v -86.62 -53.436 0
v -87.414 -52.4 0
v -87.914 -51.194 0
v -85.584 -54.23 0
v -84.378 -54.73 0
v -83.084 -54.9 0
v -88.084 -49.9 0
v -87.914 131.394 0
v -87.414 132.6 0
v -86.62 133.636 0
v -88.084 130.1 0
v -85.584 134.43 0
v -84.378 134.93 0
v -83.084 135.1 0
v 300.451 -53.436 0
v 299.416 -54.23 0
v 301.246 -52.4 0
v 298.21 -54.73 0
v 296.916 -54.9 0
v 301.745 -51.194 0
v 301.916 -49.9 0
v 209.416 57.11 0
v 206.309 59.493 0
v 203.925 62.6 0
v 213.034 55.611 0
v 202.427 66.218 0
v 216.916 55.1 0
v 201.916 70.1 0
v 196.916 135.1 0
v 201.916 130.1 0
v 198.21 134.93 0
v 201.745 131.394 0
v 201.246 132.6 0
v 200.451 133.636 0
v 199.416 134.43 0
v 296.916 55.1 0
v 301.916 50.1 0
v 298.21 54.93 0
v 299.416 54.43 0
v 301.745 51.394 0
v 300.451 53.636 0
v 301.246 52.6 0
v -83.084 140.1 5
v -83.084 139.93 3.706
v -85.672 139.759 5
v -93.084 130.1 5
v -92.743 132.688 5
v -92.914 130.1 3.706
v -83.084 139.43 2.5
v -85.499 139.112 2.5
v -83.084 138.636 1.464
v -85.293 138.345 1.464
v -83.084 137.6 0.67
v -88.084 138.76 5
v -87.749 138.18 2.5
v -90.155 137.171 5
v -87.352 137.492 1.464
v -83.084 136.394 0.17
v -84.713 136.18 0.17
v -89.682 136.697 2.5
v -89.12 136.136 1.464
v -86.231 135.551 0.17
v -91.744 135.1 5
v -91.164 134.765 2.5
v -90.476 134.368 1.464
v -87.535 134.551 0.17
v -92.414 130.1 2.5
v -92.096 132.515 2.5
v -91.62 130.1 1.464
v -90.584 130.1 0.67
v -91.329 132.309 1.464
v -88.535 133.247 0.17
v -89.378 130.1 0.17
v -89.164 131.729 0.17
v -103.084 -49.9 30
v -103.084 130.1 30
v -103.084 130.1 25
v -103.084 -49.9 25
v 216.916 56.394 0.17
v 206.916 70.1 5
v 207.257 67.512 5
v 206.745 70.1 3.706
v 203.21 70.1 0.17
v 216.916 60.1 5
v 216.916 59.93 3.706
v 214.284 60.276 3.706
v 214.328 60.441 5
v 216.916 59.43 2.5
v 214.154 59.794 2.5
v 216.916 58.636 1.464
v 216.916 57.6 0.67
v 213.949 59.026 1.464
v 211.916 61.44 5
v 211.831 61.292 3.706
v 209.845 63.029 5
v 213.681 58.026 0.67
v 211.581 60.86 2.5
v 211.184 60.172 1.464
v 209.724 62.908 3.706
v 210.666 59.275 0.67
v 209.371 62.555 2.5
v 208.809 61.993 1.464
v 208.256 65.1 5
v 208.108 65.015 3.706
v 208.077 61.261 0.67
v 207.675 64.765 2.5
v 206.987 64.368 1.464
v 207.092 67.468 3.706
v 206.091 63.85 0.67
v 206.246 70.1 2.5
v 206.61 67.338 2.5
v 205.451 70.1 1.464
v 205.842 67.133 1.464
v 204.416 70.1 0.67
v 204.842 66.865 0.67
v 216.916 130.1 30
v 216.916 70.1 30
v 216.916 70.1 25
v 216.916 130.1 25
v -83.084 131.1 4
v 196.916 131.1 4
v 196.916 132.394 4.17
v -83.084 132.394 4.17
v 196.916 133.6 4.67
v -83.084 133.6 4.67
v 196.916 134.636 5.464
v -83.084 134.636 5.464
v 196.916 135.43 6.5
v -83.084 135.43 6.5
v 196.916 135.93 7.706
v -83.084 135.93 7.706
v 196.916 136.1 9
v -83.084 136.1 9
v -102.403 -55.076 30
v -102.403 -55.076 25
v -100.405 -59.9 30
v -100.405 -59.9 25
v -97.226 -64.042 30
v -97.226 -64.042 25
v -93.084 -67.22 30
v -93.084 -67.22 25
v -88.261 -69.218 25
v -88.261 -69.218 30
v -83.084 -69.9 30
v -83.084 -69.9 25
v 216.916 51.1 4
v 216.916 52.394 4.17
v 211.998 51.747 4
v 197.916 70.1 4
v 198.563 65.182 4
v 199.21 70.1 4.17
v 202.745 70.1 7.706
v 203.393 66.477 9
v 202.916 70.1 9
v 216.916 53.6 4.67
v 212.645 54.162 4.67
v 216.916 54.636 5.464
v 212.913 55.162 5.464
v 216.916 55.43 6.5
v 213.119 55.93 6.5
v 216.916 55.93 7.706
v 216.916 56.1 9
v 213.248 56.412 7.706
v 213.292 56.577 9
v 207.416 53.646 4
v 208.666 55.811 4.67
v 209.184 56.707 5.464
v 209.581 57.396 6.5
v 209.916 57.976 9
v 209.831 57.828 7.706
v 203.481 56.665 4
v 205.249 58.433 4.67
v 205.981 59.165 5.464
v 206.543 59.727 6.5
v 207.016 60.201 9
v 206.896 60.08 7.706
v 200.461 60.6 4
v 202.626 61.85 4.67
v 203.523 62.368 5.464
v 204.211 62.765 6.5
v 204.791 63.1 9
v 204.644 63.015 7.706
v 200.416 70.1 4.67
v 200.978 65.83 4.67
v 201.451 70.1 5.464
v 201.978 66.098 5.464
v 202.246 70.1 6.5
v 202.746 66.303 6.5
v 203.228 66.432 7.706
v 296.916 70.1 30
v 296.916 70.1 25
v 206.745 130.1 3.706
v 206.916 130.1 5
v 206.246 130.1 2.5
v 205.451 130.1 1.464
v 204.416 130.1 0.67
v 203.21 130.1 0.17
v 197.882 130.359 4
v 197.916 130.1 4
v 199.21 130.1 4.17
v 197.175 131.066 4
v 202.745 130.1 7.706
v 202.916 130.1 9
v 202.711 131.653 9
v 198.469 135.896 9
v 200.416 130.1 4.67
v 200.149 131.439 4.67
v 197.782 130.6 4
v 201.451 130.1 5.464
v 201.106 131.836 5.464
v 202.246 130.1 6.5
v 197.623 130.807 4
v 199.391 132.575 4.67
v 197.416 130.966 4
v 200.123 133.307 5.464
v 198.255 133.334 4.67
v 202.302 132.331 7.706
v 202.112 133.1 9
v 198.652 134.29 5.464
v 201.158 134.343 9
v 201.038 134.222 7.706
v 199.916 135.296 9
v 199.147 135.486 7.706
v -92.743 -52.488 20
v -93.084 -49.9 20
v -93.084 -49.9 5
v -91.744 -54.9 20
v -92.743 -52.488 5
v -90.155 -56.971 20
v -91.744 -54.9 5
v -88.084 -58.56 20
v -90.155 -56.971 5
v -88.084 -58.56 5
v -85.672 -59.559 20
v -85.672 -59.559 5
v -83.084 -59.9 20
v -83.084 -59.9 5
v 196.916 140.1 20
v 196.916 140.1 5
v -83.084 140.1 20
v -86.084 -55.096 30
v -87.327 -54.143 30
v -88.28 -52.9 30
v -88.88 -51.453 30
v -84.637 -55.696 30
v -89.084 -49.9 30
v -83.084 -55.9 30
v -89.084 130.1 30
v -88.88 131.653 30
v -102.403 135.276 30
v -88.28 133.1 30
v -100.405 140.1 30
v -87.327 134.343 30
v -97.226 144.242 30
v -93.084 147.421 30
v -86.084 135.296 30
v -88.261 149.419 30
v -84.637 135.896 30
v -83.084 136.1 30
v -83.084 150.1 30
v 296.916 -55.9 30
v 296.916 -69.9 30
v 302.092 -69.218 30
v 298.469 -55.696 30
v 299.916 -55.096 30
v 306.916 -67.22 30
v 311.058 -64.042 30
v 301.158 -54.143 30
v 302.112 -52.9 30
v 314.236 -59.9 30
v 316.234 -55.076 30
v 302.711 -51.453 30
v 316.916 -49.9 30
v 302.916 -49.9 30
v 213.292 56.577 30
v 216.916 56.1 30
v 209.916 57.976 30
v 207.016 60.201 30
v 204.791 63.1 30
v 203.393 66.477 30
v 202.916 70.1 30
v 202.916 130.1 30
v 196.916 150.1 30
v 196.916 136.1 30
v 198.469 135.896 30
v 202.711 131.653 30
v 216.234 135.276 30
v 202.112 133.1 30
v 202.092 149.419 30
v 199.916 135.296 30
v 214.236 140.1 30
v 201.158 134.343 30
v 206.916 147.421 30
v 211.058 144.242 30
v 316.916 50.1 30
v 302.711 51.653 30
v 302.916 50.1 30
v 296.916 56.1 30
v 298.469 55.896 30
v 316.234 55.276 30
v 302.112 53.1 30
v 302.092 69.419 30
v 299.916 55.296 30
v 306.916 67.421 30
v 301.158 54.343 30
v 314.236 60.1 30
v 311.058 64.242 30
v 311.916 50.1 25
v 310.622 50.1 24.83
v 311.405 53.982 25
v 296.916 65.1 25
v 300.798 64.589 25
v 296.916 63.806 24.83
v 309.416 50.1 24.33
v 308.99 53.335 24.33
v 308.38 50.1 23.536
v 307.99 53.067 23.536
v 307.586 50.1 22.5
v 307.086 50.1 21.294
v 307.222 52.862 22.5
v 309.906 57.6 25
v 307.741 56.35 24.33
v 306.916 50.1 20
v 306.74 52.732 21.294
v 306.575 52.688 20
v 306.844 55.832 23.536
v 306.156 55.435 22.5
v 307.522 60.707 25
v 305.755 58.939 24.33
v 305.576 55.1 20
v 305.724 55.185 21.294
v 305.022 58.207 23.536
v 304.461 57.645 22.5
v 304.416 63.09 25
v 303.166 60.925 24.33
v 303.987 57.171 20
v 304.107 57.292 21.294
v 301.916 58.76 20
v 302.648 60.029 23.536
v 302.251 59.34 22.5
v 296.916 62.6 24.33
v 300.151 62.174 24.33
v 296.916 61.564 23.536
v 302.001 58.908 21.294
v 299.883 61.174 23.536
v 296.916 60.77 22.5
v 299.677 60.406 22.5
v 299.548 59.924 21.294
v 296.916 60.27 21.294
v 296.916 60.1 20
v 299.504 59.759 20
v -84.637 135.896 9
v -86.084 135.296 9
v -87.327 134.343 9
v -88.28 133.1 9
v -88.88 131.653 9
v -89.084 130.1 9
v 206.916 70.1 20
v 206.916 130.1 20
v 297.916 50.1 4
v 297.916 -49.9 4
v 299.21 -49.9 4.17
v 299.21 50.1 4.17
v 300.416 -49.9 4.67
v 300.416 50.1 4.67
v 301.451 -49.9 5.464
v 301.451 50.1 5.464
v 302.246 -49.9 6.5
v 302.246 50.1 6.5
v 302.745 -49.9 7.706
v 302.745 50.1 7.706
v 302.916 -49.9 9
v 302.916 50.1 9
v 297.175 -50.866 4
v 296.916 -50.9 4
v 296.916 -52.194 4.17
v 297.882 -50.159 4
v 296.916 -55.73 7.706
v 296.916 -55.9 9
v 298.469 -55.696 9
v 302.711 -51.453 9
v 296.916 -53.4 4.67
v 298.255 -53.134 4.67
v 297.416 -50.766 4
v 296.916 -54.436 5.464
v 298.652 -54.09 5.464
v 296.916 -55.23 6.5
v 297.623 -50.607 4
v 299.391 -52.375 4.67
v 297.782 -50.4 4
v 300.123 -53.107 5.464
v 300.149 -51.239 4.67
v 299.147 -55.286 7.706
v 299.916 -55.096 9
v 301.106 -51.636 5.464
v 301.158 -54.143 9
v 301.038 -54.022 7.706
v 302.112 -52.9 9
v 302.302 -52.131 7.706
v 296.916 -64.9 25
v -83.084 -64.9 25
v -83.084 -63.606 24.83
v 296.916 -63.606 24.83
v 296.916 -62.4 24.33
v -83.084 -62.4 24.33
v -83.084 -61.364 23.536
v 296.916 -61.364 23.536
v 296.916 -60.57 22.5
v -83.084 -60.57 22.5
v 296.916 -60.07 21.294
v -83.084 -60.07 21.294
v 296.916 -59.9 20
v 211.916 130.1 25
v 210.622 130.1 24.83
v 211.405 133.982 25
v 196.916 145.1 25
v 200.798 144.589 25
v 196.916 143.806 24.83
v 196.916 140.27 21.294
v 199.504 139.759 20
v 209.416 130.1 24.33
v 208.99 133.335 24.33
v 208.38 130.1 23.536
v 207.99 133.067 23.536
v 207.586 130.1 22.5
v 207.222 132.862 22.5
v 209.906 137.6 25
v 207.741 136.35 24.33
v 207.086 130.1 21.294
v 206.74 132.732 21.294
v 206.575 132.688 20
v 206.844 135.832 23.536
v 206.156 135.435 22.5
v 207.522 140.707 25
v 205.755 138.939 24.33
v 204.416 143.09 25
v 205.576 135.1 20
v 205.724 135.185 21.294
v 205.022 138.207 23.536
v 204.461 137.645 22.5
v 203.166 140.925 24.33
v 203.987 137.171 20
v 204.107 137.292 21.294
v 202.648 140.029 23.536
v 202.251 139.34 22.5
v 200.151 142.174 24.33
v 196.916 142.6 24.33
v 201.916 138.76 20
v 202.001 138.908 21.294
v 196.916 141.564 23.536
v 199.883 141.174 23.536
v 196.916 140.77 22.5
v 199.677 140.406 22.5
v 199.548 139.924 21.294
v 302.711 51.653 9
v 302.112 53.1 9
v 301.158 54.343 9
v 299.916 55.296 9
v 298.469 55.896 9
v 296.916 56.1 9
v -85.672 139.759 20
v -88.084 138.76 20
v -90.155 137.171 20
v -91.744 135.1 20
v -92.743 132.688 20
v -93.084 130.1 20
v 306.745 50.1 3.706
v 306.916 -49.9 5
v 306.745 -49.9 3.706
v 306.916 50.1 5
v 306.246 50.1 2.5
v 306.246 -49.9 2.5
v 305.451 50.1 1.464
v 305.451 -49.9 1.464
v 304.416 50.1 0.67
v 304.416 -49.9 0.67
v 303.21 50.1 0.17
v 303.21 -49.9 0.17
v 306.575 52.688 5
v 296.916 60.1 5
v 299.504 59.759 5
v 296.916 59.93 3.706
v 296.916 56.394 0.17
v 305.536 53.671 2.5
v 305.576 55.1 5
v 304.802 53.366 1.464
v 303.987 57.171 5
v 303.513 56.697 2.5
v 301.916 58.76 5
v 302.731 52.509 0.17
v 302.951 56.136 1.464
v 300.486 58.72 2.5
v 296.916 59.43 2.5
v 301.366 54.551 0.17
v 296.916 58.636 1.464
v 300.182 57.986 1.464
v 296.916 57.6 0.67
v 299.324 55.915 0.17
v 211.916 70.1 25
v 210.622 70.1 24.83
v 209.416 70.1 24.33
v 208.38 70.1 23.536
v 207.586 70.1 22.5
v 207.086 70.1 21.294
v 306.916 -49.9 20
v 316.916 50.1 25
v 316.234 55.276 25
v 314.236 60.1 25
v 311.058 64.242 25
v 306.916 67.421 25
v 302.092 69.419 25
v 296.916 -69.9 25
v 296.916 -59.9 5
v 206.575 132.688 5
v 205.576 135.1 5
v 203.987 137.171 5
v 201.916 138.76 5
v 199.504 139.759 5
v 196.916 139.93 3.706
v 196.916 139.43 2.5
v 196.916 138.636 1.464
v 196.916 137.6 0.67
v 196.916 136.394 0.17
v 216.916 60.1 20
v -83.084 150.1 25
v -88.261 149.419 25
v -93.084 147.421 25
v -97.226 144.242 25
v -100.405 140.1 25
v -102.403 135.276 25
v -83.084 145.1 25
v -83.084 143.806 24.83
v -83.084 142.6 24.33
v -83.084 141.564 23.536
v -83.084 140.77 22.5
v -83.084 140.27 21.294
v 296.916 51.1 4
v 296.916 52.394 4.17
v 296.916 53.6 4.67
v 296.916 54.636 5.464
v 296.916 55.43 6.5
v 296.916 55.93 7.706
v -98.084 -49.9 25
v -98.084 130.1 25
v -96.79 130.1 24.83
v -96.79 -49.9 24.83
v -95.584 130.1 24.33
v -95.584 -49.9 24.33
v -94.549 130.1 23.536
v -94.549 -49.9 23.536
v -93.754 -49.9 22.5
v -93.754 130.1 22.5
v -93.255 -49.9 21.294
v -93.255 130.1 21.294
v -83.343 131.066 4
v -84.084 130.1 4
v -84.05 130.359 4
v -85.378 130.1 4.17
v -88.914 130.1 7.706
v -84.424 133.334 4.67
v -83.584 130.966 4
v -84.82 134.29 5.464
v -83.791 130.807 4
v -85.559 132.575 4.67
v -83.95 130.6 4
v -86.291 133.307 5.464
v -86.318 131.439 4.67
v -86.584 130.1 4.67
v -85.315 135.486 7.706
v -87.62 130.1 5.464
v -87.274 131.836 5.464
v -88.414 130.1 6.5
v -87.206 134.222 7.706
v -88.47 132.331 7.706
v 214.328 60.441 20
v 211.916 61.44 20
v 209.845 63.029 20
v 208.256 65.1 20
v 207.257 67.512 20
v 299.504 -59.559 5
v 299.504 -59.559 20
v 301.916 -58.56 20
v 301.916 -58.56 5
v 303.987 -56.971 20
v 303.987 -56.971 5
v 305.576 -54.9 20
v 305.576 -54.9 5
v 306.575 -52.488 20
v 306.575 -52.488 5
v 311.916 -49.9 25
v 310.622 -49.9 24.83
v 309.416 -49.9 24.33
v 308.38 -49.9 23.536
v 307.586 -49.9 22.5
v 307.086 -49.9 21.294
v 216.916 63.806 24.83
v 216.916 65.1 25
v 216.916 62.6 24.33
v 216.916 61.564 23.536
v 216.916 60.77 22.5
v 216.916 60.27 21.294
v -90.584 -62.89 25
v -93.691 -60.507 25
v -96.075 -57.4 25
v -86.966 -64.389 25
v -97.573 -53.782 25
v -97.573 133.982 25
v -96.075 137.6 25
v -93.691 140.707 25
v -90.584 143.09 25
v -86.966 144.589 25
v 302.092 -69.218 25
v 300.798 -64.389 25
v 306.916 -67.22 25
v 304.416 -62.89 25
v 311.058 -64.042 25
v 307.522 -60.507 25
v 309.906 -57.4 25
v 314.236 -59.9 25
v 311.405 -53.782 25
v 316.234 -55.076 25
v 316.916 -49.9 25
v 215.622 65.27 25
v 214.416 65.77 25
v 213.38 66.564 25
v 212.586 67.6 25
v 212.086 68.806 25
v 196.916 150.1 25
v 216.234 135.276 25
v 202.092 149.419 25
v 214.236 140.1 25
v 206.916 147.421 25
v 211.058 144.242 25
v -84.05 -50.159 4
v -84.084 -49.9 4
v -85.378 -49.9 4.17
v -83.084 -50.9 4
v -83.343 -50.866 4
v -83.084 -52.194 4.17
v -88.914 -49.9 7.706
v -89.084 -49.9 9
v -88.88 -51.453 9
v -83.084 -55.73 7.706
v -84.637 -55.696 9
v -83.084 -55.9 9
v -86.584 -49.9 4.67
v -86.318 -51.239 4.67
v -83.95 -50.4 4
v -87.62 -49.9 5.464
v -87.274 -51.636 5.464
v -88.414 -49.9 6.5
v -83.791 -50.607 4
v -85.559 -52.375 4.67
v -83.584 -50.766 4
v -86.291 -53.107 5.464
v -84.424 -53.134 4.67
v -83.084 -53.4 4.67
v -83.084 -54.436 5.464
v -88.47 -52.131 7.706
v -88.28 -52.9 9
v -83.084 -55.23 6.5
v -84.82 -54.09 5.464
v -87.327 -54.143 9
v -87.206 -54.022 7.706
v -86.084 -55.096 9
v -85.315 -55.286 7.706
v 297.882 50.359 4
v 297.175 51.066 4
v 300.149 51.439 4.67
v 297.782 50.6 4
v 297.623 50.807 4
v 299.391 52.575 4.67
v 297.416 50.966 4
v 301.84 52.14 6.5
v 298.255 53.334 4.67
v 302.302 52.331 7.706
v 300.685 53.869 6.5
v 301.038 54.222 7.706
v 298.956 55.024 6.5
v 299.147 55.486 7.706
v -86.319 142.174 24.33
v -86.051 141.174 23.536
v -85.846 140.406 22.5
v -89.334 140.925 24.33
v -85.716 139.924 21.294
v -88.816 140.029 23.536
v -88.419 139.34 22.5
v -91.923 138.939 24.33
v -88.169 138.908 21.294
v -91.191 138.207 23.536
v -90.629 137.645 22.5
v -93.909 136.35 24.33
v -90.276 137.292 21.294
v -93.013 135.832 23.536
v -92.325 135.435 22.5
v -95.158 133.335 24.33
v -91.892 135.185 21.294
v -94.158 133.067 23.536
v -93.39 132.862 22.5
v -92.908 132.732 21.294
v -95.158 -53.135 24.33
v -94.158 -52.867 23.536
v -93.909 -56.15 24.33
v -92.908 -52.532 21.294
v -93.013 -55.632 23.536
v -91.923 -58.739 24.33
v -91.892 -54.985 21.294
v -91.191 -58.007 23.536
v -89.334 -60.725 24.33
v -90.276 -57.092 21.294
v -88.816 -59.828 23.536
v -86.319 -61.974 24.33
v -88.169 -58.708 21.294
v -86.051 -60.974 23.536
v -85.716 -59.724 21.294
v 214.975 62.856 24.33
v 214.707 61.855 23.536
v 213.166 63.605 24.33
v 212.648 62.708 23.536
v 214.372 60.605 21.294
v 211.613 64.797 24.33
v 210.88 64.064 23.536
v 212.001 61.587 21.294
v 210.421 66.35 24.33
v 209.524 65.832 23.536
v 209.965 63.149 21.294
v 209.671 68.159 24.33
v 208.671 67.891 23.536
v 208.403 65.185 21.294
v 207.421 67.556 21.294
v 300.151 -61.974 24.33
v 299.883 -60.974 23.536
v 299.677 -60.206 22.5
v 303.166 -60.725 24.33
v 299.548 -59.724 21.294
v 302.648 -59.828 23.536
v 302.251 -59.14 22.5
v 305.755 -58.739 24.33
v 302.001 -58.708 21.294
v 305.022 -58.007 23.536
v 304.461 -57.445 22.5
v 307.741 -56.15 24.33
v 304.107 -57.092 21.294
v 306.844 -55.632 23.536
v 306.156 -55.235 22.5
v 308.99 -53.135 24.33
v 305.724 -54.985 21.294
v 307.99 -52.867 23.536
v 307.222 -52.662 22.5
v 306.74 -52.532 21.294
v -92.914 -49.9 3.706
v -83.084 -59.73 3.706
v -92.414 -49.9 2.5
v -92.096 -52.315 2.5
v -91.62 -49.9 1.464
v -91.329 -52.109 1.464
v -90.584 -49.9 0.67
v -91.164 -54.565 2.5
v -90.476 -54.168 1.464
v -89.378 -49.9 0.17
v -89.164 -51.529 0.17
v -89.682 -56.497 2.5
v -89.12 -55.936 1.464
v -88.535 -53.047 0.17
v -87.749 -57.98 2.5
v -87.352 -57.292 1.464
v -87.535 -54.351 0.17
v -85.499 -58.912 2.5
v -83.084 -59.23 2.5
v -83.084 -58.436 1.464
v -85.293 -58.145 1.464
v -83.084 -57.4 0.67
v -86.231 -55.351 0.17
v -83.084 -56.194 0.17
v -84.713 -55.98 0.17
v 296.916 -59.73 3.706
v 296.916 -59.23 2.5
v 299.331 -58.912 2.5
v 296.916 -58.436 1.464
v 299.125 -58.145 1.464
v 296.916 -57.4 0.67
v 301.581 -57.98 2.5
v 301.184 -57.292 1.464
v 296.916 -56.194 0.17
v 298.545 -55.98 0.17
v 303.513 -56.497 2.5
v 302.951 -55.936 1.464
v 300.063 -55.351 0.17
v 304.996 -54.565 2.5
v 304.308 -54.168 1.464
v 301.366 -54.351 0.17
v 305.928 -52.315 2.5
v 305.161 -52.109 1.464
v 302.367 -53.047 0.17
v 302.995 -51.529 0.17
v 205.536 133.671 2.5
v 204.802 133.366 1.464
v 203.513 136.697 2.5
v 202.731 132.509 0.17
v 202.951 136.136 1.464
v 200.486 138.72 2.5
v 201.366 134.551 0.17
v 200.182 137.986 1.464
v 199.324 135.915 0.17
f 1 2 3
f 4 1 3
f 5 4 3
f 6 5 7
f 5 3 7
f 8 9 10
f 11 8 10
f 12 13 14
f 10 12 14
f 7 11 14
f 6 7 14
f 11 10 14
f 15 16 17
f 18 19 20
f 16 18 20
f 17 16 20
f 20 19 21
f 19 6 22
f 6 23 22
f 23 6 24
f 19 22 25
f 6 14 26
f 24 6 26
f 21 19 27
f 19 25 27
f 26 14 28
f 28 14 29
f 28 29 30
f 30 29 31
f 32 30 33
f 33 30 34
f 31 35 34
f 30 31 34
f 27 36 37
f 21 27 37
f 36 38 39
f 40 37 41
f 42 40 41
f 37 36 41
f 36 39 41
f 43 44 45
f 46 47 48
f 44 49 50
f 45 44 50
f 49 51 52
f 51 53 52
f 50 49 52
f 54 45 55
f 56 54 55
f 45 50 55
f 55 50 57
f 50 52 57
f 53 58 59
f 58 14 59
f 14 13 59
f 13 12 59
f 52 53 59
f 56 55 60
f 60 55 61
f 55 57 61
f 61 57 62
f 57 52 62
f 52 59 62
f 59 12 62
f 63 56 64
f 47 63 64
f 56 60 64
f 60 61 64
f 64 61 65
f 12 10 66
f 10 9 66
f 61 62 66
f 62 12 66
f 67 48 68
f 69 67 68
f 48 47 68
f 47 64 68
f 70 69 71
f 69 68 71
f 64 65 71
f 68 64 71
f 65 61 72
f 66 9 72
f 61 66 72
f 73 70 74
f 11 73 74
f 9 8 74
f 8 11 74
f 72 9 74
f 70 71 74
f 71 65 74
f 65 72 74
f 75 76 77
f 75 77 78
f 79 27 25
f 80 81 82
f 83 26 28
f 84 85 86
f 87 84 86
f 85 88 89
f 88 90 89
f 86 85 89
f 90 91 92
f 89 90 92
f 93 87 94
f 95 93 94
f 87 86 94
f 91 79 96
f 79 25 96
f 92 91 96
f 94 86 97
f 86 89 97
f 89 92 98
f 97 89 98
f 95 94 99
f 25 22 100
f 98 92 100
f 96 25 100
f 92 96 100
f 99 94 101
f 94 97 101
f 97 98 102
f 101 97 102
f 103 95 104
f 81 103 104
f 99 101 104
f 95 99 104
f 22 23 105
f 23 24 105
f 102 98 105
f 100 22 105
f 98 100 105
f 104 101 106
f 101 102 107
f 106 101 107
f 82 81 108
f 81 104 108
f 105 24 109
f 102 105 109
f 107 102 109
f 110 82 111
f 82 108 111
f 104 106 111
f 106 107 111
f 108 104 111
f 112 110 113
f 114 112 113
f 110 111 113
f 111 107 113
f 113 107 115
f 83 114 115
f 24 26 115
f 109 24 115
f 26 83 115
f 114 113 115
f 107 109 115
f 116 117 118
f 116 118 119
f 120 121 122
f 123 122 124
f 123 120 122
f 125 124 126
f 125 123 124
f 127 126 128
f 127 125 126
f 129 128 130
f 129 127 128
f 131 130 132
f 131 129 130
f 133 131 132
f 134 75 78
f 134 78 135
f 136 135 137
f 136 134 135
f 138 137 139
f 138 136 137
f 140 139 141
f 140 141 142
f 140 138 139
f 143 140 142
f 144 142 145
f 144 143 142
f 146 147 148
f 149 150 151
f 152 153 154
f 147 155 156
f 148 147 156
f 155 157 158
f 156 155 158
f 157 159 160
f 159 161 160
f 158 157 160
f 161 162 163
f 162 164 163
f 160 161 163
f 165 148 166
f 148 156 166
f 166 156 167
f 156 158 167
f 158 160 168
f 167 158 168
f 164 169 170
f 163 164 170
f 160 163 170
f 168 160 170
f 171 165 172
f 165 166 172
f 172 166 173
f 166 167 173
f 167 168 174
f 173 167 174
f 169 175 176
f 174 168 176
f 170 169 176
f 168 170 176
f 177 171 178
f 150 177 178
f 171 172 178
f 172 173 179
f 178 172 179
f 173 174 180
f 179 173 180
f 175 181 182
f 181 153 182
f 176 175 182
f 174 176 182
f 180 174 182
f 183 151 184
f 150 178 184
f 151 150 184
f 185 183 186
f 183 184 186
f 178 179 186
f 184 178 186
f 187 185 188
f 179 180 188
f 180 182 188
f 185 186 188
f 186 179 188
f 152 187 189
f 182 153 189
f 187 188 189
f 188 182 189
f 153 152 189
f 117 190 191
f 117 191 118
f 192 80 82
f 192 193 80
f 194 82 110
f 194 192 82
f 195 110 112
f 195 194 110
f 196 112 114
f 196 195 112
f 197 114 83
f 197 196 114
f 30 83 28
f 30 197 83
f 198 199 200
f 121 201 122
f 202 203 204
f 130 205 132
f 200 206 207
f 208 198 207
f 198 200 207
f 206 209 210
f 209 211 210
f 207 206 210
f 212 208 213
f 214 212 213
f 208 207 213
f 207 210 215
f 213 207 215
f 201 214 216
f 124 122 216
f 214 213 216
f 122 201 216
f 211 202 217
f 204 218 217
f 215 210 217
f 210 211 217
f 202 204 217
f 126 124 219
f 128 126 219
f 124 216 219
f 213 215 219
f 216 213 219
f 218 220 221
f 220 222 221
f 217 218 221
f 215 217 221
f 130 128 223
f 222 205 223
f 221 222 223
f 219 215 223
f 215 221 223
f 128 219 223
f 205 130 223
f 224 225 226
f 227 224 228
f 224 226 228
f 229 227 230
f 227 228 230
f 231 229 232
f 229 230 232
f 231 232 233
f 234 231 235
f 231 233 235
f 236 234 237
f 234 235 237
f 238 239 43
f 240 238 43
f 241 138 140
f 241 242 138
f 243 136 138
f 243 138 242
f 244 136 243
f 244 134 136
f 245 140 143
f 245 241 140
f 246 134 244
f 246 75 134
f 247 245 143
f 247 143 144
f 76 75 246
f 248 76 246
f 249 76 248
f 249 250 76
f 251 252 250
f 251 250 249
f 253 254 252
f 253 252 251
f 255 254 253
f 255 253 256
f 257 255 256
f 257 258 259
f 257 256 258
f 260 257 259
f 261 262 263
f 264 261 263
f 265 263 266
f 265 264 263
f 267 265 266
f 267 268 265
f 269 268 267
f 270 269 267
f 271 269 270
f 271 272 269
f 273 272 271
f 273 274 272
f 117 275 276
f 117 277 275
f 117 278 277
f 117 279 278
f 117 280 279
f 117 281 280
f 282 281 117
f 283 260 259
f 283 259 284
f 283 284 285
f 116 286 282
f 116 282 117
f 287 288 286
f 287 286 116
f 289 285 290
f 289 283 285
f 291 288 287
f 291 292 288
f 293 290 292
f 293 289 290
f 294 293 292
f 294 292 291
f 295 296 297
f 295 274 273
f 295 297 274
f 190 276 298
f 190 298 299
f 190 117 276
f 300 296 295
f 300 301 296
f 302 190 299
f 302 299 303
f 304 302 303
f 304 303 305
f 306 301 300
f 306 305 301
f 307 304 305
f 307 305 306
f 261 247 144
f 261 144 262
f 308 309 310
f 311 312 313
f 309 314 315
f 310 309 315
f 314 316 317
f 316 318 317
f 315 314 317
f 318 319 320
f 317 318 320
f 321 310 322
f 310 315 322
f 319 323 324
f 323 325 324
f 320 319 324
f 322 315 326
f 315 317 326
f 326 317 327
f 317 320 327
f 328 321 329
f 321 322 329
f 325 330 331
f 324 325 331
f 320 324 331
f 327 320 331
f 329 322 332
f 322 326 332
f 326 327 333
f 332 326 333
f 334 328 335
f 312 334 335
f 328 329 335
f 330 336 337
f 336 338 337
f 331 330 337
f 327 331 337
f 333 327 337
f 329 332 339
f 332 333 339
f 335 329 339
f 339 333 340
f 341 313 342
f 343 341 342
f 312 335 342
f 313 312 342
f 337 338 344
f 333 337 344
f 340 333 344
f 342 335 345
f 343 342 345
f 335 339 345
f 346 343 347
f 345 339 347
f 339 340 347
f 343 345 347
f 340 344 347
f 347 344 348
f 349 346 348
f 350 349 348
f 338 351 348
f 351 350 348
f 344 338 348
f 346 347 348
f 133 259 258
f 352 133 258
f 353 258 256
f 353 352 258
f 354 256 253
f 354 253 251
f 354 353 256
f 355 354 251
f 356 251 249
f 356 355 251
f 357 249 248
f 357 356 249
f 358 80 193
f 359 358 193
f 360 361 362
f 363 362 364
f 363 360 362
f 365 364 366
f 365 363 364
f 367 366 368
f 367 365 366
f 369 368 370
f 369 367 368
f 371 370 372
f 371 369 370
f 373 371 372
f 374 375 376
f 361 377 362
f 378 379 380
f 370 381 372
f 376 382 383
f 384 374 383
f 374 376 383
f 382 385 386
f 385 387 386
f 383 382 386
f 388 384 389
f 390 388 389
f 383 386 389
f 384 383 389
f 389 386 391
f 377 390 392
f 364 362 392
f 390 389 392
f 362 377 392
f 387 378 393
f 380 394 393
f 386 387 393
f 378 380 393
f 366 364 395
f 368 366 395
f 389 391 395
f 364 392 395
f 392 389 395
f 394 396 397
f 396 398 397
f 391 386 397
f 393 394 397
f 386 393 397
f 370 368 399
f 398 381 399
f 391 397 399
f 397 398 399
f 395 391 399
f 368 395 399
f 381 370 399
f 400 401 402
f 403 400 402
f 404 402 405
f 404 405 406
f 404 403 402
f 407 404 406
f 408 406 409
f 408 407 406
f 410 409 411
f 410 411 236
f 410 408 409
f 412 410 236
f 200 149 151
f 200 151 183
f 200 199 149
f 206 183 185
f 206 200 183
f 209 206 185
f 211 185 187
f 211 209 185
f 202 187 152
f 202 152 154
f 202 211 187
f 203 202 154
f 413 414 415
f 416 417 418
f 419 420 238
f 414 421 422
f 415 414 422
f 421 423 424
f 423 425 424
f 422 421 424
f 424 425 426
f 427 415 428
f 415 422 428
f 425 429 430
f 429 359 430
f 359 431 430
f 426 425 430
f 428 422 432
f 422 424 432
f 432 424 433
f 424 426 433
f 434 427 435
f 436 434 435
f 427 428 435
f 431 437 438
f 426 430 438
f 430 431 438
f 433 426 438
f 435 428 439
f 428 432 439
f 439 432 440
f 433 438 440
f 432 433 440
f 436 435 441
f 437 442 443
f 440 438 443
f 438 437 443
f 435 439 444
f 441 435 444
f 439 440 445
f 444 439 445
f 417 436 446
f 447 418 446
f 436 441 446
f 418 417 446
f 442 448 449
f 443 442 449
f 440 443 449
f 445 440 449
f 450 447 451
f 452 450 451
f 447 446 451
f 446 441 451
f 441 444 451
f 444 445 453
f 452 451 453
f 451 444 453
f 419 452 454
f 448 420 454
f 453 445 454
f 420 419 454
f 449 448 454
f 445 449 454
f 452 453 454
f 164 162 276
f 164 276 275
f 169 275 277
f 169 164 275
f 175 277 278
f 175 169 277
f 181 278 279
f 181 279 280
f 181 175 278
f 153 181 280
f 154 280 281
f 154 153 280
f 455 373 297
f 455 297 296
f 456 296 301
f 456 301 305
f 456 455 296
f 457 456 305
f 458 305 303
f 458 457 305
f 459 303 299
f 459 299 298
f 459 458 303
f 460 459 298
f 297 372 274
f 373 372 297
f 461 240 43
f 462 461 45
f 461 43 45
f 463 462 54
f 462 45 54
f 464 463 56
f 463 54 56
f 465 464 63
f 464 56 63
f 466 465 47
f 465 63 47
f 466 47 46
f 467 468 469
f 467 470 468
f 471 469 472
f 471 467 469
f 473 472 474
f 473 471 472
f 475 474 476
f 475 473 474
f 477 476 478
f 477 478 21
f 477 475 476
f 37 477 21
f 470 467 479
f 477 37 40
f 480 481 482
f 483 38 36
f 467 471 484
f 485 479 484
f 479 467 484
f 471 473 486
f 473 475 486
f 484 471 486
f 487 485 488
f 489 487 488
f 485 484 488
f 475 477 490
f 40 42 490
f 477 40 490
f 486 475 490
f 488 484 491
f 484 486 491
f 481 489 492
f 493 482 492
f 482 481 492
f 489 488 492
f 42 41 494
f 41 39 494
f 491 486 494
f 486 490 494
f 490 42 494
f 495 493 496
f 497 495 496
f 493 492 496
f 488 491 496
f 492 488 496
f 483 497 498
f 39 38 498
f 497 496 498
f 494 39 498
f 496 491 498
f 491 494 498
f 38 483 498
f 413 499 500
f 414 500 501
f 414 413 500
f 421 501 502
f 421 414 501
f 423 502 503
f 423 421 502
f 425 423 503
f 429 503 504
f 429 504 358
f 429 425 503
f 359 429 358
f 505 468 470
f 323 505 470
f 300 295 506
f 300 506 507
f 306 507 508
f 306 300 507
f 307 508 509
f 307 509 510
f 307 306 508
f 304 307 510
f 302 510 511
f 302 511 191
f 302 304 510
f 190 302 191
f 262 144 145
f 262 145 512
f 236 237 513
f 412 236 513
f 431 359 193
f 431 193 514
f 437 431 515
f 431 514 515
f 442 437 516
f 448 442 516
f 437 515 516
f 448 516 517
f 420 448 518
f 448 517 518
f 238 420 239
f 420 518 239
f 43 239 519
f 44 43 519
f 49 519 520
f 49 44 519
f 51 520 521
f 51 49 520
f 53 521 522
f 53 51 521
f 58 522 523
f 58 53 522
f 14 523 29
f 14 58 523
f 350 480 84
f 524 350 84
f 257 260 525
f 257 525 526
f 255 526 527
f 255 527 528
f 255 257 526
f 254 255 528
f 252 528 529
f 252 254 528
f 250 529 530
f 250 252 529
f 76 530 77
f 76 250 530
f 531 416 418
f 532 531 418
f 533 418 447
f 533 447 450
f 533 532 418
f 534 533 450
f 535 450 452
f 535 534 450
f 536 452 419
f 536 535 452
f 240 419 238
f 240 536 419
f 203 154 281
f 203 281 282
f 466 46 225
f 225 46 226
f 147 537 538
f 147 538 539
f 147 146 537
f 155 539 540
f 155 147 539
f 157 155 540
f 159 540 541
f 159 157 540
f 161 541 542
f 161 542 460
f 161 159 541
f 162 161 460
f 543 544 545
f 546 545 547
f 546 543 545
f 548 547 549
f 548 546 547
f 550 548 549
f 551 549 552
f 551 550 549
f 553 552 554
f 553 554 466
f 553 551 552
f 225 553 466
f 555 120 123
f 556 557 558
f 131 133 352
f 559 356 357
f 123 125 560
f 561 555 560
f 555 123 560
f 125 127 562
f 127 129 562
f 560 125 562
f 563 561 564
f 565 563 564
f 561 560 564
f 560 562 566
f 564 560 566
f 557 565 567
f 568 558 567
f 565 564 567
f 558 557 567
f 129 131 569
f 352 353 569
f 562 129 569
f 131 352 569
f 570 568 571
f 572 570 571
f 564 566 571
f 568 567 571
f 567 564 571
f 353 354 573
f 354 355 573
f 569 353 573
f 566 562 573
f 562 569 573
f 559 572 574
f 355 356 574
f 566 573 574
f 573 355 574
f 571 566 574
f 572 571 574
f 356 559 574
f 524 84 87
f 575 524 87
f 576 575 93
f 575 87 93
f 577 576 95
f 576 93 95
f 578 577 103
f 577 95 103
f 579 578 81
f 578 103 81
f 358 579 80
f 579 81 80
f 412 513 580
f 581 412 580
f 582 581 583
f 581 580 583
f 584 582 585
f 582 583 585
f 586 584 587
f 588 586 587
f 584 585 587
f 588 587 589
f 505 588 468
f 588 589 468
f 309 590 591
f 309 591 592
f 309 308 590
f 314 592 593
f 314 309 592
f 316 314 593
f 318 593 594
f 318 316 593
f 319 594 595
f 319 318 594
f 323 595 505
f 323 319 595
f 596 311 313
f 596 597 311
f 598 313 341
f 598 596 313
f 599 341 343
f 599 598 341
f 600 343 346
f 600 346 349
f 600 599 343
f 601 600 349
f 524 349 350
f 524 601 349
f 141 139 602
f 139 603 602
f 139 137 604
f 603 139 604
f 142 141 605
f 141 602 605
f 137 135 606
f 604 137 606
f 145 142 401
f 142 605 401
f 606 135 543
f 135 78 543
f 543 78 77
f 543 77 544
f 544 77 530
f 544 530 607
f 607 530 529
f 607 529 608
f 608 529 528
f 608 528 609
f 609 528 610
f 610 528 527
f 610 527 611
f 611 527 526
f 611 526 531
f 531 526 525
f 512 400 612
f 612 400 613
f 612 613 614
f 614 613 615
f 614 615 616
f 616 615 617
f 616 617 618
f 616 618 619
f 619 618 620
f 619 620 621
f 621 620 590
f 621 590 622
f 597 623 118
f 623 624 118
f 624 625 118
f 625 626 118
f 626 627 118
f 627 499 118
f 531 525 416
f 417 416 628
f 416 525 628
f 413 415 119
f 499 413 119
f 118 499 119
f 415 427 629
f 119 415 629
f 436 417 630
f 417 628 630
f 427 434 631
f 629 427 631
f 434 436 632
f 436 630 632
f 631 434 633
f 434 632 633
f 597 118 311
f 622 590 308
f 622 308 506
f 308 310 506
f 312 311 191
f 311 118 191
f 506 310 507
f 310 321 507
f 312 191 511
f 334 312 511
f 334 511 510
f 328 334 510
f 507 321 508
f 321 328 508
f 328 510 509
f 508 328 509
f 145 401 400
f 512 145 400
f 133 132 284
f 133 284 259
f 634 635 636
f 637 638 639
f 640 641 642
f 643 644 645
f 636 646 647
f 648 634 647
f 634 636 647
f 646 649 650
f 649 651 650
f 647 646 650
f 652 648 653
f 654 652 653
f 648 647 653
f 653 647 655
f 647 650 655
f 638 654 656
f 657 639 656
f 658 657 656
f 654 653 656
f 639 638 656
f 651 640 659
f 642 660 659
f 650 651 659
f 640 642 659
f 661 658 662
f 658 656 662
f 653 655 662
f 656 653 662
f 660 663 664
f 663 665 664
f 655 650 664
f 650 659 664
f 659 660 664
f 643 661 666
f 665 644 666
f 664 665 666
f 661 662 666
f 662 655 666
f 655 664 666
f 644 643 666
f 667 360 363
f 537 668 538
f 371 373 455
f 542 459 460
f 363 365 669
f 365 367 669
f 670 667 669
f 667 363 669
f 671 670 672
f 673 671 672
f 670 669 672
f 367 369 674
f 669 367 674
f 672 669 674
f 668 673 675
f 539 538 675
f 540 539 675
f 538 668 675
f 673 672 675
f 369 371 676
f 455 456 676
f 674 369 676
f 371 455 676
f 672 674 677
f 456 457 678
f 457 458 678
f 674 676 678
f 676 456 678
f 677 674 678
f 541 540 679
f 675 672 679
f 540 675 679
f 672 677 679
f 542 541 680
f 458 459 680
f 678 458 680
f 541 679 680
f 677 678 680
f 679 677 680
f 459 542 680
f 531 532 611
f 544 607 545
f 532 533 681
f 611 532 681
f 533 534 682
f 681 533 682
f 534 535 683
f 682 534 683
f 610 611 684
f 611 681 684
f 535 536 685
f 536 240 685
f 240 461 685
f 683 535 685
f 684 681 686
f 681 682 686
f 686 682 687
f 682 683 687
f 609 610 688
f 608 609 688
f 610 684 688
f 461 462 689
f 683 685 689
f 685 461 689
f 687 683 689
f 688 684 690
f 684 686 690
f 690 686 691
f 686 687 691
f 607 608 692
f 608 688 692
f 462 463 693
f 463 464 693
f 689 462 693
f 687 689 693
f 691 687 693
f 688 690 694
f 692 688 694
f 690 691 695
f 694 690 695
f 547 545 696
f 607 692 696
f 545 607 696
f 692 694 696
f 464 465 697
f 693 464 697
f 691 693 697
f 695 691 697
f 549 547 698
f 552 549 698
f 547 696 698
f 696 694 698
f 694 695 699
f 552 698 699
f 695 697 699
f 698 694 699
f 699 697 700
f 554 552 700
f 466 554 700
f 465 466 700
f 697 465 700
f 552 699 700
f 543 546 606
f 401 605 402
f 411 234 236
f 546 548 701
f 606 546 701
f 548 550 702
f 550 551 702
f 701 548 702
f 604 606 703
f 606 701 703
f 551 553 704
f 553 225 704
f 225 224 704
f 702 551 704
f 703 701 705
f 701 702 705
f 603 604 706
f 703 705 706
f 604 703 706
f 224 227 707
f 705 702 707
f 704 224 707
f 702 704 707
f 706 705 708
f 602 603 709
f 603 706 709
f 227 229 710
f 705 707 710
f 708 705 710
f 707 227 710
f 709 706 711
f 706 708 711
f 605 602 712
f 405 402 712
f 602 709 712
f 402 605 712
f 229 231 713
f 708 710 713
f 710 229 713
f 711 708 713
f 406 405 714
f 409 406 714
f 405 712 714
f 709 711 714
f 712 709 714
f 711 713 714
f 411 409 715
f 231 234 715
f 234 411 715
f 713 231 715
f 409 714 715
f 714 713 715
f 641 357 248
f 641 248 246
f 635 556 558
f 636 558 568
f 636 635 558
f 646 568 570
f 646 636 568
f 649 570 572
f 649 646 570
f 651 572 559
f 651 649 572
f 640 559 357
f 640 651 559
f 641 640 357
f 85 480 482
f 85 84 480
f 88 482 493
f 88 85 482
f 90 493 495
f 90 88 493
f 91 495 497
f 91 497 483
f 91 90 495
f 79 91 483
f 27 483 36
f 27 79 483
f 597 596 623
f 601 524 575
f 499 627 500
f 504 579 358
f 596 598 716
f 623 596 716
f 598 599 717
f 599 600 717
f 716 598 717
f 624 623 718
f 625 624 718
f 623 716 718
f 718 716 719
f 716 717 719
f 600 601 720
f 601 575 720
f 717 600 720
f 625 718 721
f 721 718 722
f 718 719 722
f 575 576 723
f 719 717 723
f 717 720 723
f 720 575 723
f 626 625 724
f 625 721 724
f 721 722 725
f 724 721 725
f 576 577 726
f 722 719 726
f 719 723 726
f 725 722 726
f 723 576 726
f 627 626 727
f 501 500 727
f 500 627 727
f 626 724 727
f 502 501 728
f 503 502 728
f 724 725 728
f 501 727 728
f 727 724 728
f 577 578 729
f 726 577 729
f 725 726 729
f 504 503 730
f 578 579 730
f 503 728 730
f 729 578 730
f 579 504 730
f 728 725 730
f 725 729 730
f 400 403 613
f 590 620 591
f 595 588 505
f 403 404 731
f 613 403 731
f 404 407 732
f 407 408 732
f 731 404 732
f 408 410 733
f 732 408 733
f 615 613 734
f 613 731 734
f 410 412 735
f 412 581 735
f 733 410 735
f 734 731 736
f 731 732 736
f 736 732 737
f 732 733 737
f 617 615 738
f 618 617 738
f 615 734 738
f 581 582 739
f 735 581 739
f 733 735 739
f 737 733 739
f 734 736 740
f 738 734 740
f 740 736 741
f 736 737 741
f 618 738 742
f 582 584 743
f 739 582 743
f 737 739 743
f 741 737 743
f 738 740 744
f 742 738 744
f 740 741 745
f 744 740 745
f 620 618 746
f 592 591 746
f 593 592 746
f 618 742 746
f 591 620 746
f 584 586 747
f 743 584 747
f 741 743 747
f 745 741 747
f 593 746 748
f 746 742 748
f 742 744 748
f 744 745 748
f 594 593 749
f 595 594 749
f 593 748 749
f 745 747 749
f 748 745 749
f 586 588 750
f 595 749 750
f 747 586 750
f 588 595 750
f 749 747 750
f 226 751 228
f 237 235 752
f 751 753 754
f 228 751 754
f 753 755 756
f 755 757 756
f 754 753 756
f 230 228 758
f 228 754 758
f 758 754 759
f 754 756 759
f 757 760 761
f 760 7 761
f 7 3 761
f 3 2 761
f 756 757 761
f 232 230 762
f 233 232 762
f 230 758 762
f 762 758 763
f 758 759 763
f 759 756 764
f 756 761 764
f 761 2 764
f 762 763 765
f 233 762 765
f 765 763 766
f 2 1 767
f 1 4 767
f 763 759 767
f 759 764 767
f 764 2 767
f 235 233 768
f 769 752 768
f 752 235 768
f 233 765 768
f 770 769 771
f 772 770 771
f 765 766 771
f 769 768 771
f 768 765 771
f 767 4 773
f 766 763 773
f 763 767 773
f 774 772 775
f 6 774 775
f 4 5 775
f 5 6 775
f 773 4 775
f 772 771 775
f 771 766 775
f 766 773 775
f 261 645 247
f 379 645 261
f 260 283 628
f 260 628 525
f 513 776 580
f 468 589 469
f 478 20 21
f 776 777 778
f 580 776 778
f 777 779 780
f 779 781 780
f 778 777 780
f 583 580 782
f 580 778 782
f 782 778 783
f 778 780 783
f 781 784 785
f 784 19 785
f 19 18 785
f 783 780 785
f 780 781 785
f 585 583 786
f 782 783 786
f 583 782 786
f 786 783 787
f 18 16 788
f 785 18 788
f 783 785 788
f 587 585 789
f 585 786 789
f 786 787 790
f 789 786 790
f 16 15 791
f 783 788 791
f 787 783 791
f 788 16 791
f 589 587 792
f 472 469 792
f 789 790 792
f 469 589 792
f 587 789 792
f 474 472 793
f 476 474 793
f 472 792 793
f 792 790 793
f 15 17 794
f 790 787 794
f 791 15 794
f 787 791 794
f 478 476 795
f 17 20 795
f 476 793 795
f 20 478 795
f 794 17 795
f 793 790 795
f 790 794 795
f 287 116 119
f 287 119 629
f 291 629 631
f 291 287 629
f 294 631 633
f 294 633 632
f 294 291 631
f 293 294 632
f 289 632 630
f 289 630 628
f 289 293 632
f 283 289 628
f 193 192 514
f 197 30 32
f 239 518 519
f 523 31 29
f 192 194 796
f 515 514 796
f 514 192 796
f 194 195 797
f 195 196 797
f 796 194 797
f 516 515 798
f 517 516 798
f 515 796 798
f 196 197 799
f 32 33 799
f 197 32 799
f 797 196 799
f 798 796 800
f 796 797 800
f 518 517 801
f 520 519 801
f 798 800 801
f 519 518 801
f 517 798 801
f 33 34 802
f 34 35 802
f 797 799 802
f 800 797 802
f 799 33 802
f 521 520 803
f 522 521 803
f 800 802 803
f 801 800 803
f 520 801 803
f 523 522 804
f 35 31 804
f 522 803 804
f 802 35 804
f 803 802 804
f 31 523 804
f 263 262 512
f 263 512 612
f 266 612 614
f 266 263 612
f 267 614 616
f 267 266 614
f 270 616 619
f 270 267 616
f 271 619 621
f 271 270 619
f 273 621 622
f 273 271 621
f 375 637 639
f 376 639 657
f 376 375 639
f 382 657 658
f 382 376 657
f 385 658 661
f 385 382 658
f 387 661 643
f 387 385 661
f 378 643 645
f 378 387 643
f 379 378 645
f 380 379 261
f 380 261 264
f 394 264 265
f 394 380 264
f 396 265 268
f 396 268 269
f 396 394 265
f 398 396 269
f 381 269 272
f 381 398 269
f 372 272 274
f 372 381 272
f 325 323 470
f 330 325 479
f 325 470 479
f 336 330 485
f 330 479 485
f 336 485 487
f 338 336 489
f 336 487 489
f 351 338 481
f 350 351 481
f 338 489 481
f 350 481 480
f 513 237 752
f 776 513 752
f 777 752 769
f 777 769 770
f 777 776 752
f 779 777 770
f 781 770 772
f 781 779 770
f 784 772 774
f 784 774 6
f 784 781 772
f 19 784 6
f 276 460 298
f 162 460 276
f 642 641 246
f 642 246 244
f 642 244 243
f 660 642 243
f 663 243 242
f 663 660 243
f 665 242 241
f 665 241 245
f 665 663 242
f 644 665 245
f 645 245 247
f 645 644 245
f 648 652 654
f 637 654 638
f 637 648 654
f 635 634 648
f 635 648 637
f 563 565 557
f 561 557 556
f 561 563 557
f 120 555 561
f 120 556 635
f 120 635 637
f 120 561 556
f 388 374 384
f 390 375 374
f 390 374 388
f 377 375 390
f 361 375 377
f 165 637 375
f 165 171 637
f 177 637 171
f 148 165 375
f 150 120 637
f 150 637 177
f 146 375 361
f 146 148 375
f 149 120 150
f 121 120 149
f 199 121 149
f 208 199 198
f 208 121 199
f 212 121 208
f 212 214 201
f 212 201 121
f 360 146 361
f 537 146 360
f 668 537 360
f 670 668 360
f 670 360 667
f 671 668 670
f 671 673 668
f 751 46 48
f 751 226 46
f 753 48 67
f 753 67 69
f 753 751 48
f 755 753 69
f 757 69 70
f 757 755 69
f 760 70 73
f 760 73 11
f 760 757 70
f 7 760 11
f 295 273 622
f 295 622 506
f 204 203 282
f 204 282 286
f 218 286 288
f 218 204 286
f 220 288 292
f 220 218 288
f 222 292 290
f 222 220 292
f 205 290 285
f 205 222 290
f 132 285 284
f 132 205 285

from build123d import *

# Parameters (mm, degrees)
F1_DEPTH = 30
F2_T     = -4
F4_DEPTH = 5
F5_R     = 5
F6_R     = 5


with BuildPart() as f1:
    # F0 (on Top) → F1 (new body)
    with BuildSketch(Plane.XY):
        with BuildLine():
            ThreePointArc((-83.0841619524, 140.1000192761), (-90.1552297642, 137.171087088), (-93.0841619524, 130.1000192761))
            Line((-93.0841619524, 130.1000192761), (-93.0841619524, -49.8999807239))
            ThreePointArc((-93.0841619524, -49.8999807239), (-90.1552297642, -56.9710485357), (-83.0841619524, -59.8999807239))
            Line((-83.0841619524, -59.8999807239), (296.9158380476, -59.8999807239))
            ThreePointArc((296.9158380476, -59.8999807239), (303.9869058595, -56.9710485357), (306.9158380476, -49.8999807239))
            Line((306.9158380476, -49.8999807239), (306.9158380476, 50.1000192761))
            ThreePointArc((306.9158380476, 50.1000192761), (303.9869058595, 57.171087088), (296.9158380476, 60.1000192761))
            Line((296.9158380476, 60.1000192761), (216.9158380476, 60.1000192761))
            ThreePointArc((216.9158380476, 60.1000192761), (209.8447702358, 63.0289514643), (206.9158380476, 70.1000192761))
            Line((206.9158380476, 70.1000192761), (206.9158380476, 130.1000192761))
            ThreePointArc((206.9158380476, 130.1000192761), (203.9869058595, 137.171087088), (196.9158380476, 140.1000192761))
            Line((196.9158380476, 140.1000192761), (-83.0841619524, 140.1000192761))
        make_face()
    extrude(amount=F1_DEPTH)

    # F2
    f2_openings = [f1.faces().sort_by_distance(p)[0] for p in [
        (90.23061, 33.426728, 30),
    ]]
    offset(amount=F2_T, openings=f2_openings)

    # F3 (on face) → F4 (join)
    with BuildSketch(Plane.XY.offset(30)):
        with BuildLine():
            Line((196.9158380476, 150.1000192761), (-83.0841619524, 150.1000192761))
            ThreePointArc((-83.0841619524, 150.1000192761), (-97.2262975761, 144.2421548999), (-103.0841619524, 130.1000192761))
            Line((-103.0841619524, 130.1000192761), (-103.0841619524, -49.8999807239))
            ThreePointArc((-103.0841619524, -49.8999807239), (-97.2262975761, -64.0421163476), (-83.0841619524, -69.8999807239))
            Line((-83.0841619524, -69.8999807239), (296.9158380476, -69.8999807239))
            ThreePointArc((296.9158380476, -69.8999807239), (311.0579736714, -64.0421163476), (316.9158380476, -49.8999807239))
            Line((316.9158380476, -49.8999807239), (316.9158380476, 50.1000192761))
            ThreePointArc((316.9158380476, 50.1000192761), (311.0579736714, 64.2421548999), (296.9158380476, 70.1000192761))
            Line((296.9158380476, 70.1000192761), (216.9158380476, 70.1000192761))
            Line((216.9158380476, 70.1000192761), (216.9158380476, 130.1000192761))
            ThreePointArc((216.9158380476, 130.1000192761), (211.0579736714, 144.2421548999), (196.9158380476, 150.1000192761))
        make_face()
        with BuildLine():
            ThreePointArc((196.9158380476, 136.1000192761), (201.1584787347, 134.3426599633), (202.9158380476, 130.1000192761))
            Line((202.9158380476, 130.1000192761), (202.9158380476, 70.1000192761))
            ThreePointArc((202.9158380476, 70.1000192761), (207.016343111, 60.2005243395), (216.9158380476, 56.1000192761))
            Line((216.9158380476, 56.1000192761), (296.9158380476, 56.1000192761))
            ThreePointArc((296.9158380476, 56.1000192761), (301.1584787347, 54.3426599633), (302.9158380476, 50.1000192761))
            Line((302.9158380476, 50.1000192761), (302.9158380476, -49.8999807239))
            ThreePointArc((302.9158380476, -49.8999807239), (301.1584787347, -54.142621411), (296.9158380476, -55.8999807239))
            Line((296.9158380476, -55.8999807239), (-83.0841619524, -55.8999807239))
            ThreePointArc((-83.0841619524, -55.8999807239), (-87.3268026395, -54.142621411), (-89.0841619524, -49.8999807239))
            Line((-89.0841619524, -49.8999807239), (-89.0841619524, 130.1000192761))
            ThreePointArc((-89.0841619524, 130.1000192761), (-87.3268026395, 134.3426599633), (-83.0841619524, 136.1000192761))
            Line((-83.0841619524, 136.1000192761), (196.9158380476, 136.1000192761))
        make_face(mode=Mode.SUBTRACT)
    extrude(amount=-F4_DEPTH)

    # F5
    f5_edges = [f1.edges().sort_by_distance(p)[0] for p in [
        (256.915838, 56.100019, 4),
        (207.016343, 60.200524, 4),
        (202.915838, 100.100019, 4),
        (201.158479, 134.34266, 4),
        (56.915838, 136.100019, 4),
        (-87.326803, 134.34266, 4),
        (-89.084162, 40.100019, 4),
        (-87.326803, -54.142621, 4),
        (106.915838, -55.899981, 4),
        (301.158479, -54.142621, 4),
        (302.915838, 0.100019, 4),
        (301.158479, 54.34266, 4),
    ]]
    fillet(f5_edges, radius=F5_R)

    # F6
    f6_edges = [f1.edges().sort_by_distance(p)[0] for p in [
        (106.915838, -59.899981, 25),
        (106.915838, -59.899981, 0),
    ]]
    fillet(f6_edges, radius=F6_R)


solid = f1.part
